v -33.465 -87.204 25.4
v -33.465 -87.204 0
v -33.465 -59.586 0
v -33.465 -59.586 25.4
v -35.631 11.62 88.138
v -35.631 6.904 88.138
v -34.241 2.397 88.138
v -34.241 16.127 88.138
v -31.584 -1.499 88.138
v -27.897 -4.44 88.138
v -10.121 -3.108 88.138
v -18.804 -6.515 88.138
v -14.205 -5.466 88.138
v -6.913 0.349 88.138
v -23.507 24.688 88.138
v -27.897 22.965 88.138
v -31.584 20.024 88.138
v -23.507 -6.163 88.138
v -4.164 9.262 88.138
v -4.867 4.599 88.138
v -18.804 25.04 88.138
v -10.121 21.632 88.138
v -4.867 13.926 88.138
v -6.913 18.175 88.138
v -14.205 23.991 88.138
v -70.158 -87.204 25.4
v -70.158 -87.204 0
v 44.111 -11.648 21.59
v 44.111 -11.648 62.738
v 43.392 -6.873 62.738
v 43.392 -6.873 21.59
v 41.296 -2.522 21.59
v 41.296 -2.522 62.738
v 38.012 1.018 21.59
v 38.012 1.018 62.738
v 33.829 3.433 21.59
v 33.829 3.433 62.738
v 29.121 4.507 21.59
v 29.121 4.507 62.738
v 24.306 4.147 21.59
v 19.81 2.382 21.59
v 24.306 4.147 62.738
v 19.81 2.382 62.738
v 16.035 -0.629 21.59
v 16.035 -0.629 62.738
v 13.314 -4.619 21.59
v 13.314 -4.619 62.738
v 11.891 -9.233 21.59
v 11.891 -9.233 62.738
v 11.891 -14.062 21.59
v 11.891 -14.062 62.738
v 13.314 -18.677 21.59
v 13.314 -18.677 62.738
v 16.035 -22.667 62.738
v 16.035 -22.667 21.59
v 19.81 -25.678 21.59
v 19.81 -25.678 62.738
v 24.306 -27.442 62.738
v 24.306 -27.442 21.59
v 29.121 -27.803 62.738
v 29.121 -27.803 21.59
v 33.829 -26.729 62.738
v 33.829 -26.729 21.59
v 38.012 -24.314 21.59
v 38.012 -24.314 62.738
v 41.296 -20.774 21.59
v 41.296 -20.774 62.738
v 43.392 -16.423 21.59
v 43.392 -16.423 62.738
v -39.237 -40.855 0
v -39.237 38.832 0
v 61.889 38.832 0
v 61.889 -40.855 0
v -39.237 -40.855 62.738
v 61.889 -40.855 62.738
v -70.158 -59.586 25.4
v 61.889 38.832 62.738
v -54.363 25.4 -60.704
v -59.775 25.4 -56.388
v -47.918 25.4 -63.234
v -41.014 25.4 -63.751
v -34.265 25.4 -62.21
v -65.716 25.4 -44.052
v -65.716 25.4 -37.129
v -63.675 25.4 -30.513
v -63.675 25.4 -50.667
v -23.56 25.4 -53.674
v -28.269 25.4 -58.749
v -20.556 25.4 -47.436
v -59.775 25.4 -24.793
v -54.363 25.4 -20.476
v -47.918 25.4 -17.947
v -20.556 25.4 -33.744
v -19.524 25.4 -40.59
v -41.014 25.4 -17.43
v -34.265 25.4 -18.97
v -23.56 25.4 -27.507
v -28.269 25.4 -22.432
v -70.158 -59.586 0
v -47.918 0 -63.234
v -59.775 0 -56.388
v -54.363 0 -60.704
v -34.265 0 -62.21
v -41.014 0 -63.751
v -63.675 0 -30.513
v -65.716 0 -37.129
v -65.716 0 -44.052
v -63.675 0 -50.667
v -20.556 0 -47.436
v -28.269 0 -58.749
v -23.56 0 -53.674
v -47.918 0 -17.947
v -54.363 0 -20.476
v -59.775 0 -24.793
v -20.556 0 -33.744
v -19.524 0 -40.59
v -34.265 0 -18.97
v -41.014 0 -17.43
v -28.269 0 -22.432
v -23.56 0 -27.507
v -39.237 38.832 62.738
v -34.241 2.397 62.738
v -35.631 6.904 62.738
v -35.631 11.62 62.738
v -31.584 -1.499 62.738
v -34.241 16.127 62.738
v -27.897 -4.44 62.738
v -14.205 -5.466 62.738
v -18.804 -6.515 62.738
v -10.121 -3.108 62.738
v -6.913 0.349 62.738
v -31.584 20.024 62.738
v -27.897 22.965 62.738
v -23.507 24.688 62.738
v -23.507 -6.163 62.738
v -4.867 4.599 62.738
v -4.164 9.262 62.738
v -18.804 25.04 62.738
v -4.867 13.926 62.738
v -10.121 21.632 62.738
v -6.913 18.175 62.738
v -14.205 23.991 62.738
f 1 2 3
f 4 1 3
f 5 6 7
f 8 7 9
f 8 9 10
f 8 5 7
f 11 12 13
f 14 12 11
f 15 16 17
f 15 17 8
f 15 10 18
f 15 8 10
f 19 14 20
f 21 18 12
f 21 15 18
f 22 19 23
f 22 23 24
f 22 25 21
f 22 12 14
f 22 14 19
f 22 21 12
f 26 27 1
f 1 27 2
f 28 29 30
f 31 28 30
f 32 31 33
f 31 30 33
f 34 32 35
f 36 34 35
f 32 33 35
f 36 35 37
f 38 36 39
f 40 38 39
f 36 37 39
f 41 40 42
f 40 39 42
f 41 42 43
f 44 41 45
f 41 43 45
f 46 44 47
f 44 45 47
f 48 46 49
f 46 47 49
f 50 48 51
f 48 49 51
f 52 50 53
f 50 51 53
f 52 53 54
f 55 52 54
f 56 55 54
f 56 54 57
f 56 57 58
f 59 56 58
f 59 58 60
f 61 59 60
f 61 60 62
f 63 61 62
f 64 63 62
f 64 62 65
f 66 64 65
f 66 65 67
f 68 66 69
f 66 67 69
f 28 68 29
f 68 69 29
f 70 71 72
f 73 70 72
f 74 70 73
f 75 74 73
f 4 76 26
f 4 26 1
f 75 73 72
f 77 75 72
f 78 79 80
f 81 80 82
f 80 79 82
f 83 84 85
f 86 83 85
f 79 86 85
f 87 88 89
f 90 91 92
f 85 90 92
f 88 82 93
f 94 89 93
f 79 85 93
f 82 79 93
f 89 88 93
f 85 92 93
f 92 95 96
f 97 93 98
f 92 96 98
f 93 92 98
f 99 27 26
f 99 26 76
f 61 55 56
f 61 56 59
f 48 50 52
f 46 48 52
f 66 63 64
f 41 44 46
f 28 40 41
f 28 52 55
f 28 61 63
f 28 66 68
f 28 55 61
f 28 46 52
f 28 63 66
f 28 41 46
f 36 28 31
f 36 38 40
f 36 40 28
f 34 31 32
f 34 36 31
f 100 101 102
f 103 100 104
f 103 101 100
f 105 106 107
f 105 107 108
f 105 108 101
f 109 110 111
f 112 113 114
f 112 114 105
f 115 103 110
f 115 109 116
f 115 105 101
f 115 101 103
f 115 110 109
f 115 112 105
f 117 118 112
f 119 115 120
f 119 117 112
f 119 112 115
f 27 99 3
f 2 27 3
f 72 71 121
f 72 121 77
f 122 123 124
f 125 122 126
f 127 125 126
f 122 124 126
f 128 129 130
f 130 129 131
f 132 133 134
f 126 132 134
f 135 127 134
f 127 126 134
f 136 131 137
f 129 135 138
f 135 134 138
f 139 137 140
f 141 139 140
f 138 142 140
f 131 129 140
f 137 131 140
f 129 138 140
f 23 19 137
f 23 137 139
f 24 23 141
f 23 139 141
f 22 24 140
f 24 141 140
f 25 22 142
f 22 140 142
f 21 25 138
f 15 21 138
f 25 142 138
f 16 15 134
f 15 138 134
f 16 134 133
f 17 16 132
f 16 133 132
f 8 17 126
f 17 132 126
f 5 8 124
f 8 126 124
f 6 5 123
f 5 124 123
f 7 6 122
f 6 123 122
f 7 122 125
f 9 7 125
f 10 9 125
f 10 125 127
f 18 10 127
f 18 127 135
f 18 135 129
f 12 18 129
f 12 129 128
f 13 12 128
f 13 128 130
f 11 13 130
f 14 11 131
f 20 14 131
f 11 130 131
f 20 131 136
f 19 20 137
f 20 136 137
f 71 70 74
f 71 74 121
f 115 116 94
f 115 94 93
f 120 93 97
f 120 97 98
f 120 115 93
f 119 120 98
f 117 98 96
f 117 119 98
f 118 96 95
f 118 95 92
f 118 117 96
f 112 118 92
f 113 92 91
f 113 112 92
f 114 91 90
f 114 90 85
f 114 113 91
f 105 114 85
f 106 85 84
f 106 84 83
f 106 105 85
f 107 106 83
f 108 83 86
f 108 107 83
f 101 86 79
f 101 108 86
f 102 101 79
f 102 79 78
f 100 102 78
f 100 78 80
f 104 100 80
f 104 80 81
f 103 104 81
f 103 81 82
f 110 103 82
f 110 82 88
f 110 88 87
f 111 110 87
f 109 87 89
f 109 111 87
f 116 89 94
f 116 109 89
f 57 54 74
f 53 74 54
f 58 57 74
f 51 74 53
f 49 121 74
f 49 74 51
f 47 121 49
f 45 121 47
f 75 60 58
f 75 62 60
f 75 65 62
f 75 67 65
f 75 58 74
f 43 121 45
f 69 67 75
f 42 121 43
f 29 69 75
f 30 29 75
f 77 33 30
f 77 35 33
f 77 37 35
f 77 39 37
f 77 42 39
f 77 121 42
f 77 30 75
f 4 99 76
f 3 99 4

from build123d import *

# Parameters (mm, degrees)
F0_W     = 101.125885
F0_H     = 79.6872
F1_DEPTH = 62.738
F2_R     = 16.200604
F3_DEPTH = 41.148
F4_W     = 36.692955
F4_H     = 27.617682
F5_DEPTH = 25.4
F6_R     = 23.225544
F7_DEPTH = 25.4
F8_R     = 15.821961
F9_DEPTH = 25.4


with BuildPart() as f1:
    # F0 (on Top) → F1 (new body)
    with BuildSketch(Plane.XY):
        with Locations((11.326099, -1.011256)):
            Rectangle(F0_W, F0_H)
    extrude(amount=F1_DEPTH)

    # F2 (on face) → F3 (cut)
    with BuildSketch(Plane.XY.offset(62.738)):
        with Locations((27.910674, -11.647913)):
            Circle(F2_R)
    extrude(amount=-F3_DEPTH, mode=Mode.SUBTRACT)


with BuildPart() as f5:
    # F4 (on Top) → F5 (new body)
    with BuildSketch(Plane.XY):
        with Locations((-51.811132, -73.394669)):
            Rectangle(F4_W, F4_H)
    extrude(amount=F5_DEPTH)


with BuildPart() as f7:
    # F6 (on Front) → F7 (new body)
    with BuildSketch(Plane.XZ):
        with Locations((-42.749807, -40.590309)):
            Circle(F6_R)
    extrude(amount=-F7_DEPTH)


with BuildPart() as f9:
    # F8 (on face) → F9 (new body)
    with BuildSketch(Plane.XY.offset(62.738)):
        with Locations((-19.985897, 9.262312)):
            Circle(F8_R)
    extrude(amount=F9_DEPTH)


solid = Compound([f1.part, f5.part, f7.part, f9.part])
